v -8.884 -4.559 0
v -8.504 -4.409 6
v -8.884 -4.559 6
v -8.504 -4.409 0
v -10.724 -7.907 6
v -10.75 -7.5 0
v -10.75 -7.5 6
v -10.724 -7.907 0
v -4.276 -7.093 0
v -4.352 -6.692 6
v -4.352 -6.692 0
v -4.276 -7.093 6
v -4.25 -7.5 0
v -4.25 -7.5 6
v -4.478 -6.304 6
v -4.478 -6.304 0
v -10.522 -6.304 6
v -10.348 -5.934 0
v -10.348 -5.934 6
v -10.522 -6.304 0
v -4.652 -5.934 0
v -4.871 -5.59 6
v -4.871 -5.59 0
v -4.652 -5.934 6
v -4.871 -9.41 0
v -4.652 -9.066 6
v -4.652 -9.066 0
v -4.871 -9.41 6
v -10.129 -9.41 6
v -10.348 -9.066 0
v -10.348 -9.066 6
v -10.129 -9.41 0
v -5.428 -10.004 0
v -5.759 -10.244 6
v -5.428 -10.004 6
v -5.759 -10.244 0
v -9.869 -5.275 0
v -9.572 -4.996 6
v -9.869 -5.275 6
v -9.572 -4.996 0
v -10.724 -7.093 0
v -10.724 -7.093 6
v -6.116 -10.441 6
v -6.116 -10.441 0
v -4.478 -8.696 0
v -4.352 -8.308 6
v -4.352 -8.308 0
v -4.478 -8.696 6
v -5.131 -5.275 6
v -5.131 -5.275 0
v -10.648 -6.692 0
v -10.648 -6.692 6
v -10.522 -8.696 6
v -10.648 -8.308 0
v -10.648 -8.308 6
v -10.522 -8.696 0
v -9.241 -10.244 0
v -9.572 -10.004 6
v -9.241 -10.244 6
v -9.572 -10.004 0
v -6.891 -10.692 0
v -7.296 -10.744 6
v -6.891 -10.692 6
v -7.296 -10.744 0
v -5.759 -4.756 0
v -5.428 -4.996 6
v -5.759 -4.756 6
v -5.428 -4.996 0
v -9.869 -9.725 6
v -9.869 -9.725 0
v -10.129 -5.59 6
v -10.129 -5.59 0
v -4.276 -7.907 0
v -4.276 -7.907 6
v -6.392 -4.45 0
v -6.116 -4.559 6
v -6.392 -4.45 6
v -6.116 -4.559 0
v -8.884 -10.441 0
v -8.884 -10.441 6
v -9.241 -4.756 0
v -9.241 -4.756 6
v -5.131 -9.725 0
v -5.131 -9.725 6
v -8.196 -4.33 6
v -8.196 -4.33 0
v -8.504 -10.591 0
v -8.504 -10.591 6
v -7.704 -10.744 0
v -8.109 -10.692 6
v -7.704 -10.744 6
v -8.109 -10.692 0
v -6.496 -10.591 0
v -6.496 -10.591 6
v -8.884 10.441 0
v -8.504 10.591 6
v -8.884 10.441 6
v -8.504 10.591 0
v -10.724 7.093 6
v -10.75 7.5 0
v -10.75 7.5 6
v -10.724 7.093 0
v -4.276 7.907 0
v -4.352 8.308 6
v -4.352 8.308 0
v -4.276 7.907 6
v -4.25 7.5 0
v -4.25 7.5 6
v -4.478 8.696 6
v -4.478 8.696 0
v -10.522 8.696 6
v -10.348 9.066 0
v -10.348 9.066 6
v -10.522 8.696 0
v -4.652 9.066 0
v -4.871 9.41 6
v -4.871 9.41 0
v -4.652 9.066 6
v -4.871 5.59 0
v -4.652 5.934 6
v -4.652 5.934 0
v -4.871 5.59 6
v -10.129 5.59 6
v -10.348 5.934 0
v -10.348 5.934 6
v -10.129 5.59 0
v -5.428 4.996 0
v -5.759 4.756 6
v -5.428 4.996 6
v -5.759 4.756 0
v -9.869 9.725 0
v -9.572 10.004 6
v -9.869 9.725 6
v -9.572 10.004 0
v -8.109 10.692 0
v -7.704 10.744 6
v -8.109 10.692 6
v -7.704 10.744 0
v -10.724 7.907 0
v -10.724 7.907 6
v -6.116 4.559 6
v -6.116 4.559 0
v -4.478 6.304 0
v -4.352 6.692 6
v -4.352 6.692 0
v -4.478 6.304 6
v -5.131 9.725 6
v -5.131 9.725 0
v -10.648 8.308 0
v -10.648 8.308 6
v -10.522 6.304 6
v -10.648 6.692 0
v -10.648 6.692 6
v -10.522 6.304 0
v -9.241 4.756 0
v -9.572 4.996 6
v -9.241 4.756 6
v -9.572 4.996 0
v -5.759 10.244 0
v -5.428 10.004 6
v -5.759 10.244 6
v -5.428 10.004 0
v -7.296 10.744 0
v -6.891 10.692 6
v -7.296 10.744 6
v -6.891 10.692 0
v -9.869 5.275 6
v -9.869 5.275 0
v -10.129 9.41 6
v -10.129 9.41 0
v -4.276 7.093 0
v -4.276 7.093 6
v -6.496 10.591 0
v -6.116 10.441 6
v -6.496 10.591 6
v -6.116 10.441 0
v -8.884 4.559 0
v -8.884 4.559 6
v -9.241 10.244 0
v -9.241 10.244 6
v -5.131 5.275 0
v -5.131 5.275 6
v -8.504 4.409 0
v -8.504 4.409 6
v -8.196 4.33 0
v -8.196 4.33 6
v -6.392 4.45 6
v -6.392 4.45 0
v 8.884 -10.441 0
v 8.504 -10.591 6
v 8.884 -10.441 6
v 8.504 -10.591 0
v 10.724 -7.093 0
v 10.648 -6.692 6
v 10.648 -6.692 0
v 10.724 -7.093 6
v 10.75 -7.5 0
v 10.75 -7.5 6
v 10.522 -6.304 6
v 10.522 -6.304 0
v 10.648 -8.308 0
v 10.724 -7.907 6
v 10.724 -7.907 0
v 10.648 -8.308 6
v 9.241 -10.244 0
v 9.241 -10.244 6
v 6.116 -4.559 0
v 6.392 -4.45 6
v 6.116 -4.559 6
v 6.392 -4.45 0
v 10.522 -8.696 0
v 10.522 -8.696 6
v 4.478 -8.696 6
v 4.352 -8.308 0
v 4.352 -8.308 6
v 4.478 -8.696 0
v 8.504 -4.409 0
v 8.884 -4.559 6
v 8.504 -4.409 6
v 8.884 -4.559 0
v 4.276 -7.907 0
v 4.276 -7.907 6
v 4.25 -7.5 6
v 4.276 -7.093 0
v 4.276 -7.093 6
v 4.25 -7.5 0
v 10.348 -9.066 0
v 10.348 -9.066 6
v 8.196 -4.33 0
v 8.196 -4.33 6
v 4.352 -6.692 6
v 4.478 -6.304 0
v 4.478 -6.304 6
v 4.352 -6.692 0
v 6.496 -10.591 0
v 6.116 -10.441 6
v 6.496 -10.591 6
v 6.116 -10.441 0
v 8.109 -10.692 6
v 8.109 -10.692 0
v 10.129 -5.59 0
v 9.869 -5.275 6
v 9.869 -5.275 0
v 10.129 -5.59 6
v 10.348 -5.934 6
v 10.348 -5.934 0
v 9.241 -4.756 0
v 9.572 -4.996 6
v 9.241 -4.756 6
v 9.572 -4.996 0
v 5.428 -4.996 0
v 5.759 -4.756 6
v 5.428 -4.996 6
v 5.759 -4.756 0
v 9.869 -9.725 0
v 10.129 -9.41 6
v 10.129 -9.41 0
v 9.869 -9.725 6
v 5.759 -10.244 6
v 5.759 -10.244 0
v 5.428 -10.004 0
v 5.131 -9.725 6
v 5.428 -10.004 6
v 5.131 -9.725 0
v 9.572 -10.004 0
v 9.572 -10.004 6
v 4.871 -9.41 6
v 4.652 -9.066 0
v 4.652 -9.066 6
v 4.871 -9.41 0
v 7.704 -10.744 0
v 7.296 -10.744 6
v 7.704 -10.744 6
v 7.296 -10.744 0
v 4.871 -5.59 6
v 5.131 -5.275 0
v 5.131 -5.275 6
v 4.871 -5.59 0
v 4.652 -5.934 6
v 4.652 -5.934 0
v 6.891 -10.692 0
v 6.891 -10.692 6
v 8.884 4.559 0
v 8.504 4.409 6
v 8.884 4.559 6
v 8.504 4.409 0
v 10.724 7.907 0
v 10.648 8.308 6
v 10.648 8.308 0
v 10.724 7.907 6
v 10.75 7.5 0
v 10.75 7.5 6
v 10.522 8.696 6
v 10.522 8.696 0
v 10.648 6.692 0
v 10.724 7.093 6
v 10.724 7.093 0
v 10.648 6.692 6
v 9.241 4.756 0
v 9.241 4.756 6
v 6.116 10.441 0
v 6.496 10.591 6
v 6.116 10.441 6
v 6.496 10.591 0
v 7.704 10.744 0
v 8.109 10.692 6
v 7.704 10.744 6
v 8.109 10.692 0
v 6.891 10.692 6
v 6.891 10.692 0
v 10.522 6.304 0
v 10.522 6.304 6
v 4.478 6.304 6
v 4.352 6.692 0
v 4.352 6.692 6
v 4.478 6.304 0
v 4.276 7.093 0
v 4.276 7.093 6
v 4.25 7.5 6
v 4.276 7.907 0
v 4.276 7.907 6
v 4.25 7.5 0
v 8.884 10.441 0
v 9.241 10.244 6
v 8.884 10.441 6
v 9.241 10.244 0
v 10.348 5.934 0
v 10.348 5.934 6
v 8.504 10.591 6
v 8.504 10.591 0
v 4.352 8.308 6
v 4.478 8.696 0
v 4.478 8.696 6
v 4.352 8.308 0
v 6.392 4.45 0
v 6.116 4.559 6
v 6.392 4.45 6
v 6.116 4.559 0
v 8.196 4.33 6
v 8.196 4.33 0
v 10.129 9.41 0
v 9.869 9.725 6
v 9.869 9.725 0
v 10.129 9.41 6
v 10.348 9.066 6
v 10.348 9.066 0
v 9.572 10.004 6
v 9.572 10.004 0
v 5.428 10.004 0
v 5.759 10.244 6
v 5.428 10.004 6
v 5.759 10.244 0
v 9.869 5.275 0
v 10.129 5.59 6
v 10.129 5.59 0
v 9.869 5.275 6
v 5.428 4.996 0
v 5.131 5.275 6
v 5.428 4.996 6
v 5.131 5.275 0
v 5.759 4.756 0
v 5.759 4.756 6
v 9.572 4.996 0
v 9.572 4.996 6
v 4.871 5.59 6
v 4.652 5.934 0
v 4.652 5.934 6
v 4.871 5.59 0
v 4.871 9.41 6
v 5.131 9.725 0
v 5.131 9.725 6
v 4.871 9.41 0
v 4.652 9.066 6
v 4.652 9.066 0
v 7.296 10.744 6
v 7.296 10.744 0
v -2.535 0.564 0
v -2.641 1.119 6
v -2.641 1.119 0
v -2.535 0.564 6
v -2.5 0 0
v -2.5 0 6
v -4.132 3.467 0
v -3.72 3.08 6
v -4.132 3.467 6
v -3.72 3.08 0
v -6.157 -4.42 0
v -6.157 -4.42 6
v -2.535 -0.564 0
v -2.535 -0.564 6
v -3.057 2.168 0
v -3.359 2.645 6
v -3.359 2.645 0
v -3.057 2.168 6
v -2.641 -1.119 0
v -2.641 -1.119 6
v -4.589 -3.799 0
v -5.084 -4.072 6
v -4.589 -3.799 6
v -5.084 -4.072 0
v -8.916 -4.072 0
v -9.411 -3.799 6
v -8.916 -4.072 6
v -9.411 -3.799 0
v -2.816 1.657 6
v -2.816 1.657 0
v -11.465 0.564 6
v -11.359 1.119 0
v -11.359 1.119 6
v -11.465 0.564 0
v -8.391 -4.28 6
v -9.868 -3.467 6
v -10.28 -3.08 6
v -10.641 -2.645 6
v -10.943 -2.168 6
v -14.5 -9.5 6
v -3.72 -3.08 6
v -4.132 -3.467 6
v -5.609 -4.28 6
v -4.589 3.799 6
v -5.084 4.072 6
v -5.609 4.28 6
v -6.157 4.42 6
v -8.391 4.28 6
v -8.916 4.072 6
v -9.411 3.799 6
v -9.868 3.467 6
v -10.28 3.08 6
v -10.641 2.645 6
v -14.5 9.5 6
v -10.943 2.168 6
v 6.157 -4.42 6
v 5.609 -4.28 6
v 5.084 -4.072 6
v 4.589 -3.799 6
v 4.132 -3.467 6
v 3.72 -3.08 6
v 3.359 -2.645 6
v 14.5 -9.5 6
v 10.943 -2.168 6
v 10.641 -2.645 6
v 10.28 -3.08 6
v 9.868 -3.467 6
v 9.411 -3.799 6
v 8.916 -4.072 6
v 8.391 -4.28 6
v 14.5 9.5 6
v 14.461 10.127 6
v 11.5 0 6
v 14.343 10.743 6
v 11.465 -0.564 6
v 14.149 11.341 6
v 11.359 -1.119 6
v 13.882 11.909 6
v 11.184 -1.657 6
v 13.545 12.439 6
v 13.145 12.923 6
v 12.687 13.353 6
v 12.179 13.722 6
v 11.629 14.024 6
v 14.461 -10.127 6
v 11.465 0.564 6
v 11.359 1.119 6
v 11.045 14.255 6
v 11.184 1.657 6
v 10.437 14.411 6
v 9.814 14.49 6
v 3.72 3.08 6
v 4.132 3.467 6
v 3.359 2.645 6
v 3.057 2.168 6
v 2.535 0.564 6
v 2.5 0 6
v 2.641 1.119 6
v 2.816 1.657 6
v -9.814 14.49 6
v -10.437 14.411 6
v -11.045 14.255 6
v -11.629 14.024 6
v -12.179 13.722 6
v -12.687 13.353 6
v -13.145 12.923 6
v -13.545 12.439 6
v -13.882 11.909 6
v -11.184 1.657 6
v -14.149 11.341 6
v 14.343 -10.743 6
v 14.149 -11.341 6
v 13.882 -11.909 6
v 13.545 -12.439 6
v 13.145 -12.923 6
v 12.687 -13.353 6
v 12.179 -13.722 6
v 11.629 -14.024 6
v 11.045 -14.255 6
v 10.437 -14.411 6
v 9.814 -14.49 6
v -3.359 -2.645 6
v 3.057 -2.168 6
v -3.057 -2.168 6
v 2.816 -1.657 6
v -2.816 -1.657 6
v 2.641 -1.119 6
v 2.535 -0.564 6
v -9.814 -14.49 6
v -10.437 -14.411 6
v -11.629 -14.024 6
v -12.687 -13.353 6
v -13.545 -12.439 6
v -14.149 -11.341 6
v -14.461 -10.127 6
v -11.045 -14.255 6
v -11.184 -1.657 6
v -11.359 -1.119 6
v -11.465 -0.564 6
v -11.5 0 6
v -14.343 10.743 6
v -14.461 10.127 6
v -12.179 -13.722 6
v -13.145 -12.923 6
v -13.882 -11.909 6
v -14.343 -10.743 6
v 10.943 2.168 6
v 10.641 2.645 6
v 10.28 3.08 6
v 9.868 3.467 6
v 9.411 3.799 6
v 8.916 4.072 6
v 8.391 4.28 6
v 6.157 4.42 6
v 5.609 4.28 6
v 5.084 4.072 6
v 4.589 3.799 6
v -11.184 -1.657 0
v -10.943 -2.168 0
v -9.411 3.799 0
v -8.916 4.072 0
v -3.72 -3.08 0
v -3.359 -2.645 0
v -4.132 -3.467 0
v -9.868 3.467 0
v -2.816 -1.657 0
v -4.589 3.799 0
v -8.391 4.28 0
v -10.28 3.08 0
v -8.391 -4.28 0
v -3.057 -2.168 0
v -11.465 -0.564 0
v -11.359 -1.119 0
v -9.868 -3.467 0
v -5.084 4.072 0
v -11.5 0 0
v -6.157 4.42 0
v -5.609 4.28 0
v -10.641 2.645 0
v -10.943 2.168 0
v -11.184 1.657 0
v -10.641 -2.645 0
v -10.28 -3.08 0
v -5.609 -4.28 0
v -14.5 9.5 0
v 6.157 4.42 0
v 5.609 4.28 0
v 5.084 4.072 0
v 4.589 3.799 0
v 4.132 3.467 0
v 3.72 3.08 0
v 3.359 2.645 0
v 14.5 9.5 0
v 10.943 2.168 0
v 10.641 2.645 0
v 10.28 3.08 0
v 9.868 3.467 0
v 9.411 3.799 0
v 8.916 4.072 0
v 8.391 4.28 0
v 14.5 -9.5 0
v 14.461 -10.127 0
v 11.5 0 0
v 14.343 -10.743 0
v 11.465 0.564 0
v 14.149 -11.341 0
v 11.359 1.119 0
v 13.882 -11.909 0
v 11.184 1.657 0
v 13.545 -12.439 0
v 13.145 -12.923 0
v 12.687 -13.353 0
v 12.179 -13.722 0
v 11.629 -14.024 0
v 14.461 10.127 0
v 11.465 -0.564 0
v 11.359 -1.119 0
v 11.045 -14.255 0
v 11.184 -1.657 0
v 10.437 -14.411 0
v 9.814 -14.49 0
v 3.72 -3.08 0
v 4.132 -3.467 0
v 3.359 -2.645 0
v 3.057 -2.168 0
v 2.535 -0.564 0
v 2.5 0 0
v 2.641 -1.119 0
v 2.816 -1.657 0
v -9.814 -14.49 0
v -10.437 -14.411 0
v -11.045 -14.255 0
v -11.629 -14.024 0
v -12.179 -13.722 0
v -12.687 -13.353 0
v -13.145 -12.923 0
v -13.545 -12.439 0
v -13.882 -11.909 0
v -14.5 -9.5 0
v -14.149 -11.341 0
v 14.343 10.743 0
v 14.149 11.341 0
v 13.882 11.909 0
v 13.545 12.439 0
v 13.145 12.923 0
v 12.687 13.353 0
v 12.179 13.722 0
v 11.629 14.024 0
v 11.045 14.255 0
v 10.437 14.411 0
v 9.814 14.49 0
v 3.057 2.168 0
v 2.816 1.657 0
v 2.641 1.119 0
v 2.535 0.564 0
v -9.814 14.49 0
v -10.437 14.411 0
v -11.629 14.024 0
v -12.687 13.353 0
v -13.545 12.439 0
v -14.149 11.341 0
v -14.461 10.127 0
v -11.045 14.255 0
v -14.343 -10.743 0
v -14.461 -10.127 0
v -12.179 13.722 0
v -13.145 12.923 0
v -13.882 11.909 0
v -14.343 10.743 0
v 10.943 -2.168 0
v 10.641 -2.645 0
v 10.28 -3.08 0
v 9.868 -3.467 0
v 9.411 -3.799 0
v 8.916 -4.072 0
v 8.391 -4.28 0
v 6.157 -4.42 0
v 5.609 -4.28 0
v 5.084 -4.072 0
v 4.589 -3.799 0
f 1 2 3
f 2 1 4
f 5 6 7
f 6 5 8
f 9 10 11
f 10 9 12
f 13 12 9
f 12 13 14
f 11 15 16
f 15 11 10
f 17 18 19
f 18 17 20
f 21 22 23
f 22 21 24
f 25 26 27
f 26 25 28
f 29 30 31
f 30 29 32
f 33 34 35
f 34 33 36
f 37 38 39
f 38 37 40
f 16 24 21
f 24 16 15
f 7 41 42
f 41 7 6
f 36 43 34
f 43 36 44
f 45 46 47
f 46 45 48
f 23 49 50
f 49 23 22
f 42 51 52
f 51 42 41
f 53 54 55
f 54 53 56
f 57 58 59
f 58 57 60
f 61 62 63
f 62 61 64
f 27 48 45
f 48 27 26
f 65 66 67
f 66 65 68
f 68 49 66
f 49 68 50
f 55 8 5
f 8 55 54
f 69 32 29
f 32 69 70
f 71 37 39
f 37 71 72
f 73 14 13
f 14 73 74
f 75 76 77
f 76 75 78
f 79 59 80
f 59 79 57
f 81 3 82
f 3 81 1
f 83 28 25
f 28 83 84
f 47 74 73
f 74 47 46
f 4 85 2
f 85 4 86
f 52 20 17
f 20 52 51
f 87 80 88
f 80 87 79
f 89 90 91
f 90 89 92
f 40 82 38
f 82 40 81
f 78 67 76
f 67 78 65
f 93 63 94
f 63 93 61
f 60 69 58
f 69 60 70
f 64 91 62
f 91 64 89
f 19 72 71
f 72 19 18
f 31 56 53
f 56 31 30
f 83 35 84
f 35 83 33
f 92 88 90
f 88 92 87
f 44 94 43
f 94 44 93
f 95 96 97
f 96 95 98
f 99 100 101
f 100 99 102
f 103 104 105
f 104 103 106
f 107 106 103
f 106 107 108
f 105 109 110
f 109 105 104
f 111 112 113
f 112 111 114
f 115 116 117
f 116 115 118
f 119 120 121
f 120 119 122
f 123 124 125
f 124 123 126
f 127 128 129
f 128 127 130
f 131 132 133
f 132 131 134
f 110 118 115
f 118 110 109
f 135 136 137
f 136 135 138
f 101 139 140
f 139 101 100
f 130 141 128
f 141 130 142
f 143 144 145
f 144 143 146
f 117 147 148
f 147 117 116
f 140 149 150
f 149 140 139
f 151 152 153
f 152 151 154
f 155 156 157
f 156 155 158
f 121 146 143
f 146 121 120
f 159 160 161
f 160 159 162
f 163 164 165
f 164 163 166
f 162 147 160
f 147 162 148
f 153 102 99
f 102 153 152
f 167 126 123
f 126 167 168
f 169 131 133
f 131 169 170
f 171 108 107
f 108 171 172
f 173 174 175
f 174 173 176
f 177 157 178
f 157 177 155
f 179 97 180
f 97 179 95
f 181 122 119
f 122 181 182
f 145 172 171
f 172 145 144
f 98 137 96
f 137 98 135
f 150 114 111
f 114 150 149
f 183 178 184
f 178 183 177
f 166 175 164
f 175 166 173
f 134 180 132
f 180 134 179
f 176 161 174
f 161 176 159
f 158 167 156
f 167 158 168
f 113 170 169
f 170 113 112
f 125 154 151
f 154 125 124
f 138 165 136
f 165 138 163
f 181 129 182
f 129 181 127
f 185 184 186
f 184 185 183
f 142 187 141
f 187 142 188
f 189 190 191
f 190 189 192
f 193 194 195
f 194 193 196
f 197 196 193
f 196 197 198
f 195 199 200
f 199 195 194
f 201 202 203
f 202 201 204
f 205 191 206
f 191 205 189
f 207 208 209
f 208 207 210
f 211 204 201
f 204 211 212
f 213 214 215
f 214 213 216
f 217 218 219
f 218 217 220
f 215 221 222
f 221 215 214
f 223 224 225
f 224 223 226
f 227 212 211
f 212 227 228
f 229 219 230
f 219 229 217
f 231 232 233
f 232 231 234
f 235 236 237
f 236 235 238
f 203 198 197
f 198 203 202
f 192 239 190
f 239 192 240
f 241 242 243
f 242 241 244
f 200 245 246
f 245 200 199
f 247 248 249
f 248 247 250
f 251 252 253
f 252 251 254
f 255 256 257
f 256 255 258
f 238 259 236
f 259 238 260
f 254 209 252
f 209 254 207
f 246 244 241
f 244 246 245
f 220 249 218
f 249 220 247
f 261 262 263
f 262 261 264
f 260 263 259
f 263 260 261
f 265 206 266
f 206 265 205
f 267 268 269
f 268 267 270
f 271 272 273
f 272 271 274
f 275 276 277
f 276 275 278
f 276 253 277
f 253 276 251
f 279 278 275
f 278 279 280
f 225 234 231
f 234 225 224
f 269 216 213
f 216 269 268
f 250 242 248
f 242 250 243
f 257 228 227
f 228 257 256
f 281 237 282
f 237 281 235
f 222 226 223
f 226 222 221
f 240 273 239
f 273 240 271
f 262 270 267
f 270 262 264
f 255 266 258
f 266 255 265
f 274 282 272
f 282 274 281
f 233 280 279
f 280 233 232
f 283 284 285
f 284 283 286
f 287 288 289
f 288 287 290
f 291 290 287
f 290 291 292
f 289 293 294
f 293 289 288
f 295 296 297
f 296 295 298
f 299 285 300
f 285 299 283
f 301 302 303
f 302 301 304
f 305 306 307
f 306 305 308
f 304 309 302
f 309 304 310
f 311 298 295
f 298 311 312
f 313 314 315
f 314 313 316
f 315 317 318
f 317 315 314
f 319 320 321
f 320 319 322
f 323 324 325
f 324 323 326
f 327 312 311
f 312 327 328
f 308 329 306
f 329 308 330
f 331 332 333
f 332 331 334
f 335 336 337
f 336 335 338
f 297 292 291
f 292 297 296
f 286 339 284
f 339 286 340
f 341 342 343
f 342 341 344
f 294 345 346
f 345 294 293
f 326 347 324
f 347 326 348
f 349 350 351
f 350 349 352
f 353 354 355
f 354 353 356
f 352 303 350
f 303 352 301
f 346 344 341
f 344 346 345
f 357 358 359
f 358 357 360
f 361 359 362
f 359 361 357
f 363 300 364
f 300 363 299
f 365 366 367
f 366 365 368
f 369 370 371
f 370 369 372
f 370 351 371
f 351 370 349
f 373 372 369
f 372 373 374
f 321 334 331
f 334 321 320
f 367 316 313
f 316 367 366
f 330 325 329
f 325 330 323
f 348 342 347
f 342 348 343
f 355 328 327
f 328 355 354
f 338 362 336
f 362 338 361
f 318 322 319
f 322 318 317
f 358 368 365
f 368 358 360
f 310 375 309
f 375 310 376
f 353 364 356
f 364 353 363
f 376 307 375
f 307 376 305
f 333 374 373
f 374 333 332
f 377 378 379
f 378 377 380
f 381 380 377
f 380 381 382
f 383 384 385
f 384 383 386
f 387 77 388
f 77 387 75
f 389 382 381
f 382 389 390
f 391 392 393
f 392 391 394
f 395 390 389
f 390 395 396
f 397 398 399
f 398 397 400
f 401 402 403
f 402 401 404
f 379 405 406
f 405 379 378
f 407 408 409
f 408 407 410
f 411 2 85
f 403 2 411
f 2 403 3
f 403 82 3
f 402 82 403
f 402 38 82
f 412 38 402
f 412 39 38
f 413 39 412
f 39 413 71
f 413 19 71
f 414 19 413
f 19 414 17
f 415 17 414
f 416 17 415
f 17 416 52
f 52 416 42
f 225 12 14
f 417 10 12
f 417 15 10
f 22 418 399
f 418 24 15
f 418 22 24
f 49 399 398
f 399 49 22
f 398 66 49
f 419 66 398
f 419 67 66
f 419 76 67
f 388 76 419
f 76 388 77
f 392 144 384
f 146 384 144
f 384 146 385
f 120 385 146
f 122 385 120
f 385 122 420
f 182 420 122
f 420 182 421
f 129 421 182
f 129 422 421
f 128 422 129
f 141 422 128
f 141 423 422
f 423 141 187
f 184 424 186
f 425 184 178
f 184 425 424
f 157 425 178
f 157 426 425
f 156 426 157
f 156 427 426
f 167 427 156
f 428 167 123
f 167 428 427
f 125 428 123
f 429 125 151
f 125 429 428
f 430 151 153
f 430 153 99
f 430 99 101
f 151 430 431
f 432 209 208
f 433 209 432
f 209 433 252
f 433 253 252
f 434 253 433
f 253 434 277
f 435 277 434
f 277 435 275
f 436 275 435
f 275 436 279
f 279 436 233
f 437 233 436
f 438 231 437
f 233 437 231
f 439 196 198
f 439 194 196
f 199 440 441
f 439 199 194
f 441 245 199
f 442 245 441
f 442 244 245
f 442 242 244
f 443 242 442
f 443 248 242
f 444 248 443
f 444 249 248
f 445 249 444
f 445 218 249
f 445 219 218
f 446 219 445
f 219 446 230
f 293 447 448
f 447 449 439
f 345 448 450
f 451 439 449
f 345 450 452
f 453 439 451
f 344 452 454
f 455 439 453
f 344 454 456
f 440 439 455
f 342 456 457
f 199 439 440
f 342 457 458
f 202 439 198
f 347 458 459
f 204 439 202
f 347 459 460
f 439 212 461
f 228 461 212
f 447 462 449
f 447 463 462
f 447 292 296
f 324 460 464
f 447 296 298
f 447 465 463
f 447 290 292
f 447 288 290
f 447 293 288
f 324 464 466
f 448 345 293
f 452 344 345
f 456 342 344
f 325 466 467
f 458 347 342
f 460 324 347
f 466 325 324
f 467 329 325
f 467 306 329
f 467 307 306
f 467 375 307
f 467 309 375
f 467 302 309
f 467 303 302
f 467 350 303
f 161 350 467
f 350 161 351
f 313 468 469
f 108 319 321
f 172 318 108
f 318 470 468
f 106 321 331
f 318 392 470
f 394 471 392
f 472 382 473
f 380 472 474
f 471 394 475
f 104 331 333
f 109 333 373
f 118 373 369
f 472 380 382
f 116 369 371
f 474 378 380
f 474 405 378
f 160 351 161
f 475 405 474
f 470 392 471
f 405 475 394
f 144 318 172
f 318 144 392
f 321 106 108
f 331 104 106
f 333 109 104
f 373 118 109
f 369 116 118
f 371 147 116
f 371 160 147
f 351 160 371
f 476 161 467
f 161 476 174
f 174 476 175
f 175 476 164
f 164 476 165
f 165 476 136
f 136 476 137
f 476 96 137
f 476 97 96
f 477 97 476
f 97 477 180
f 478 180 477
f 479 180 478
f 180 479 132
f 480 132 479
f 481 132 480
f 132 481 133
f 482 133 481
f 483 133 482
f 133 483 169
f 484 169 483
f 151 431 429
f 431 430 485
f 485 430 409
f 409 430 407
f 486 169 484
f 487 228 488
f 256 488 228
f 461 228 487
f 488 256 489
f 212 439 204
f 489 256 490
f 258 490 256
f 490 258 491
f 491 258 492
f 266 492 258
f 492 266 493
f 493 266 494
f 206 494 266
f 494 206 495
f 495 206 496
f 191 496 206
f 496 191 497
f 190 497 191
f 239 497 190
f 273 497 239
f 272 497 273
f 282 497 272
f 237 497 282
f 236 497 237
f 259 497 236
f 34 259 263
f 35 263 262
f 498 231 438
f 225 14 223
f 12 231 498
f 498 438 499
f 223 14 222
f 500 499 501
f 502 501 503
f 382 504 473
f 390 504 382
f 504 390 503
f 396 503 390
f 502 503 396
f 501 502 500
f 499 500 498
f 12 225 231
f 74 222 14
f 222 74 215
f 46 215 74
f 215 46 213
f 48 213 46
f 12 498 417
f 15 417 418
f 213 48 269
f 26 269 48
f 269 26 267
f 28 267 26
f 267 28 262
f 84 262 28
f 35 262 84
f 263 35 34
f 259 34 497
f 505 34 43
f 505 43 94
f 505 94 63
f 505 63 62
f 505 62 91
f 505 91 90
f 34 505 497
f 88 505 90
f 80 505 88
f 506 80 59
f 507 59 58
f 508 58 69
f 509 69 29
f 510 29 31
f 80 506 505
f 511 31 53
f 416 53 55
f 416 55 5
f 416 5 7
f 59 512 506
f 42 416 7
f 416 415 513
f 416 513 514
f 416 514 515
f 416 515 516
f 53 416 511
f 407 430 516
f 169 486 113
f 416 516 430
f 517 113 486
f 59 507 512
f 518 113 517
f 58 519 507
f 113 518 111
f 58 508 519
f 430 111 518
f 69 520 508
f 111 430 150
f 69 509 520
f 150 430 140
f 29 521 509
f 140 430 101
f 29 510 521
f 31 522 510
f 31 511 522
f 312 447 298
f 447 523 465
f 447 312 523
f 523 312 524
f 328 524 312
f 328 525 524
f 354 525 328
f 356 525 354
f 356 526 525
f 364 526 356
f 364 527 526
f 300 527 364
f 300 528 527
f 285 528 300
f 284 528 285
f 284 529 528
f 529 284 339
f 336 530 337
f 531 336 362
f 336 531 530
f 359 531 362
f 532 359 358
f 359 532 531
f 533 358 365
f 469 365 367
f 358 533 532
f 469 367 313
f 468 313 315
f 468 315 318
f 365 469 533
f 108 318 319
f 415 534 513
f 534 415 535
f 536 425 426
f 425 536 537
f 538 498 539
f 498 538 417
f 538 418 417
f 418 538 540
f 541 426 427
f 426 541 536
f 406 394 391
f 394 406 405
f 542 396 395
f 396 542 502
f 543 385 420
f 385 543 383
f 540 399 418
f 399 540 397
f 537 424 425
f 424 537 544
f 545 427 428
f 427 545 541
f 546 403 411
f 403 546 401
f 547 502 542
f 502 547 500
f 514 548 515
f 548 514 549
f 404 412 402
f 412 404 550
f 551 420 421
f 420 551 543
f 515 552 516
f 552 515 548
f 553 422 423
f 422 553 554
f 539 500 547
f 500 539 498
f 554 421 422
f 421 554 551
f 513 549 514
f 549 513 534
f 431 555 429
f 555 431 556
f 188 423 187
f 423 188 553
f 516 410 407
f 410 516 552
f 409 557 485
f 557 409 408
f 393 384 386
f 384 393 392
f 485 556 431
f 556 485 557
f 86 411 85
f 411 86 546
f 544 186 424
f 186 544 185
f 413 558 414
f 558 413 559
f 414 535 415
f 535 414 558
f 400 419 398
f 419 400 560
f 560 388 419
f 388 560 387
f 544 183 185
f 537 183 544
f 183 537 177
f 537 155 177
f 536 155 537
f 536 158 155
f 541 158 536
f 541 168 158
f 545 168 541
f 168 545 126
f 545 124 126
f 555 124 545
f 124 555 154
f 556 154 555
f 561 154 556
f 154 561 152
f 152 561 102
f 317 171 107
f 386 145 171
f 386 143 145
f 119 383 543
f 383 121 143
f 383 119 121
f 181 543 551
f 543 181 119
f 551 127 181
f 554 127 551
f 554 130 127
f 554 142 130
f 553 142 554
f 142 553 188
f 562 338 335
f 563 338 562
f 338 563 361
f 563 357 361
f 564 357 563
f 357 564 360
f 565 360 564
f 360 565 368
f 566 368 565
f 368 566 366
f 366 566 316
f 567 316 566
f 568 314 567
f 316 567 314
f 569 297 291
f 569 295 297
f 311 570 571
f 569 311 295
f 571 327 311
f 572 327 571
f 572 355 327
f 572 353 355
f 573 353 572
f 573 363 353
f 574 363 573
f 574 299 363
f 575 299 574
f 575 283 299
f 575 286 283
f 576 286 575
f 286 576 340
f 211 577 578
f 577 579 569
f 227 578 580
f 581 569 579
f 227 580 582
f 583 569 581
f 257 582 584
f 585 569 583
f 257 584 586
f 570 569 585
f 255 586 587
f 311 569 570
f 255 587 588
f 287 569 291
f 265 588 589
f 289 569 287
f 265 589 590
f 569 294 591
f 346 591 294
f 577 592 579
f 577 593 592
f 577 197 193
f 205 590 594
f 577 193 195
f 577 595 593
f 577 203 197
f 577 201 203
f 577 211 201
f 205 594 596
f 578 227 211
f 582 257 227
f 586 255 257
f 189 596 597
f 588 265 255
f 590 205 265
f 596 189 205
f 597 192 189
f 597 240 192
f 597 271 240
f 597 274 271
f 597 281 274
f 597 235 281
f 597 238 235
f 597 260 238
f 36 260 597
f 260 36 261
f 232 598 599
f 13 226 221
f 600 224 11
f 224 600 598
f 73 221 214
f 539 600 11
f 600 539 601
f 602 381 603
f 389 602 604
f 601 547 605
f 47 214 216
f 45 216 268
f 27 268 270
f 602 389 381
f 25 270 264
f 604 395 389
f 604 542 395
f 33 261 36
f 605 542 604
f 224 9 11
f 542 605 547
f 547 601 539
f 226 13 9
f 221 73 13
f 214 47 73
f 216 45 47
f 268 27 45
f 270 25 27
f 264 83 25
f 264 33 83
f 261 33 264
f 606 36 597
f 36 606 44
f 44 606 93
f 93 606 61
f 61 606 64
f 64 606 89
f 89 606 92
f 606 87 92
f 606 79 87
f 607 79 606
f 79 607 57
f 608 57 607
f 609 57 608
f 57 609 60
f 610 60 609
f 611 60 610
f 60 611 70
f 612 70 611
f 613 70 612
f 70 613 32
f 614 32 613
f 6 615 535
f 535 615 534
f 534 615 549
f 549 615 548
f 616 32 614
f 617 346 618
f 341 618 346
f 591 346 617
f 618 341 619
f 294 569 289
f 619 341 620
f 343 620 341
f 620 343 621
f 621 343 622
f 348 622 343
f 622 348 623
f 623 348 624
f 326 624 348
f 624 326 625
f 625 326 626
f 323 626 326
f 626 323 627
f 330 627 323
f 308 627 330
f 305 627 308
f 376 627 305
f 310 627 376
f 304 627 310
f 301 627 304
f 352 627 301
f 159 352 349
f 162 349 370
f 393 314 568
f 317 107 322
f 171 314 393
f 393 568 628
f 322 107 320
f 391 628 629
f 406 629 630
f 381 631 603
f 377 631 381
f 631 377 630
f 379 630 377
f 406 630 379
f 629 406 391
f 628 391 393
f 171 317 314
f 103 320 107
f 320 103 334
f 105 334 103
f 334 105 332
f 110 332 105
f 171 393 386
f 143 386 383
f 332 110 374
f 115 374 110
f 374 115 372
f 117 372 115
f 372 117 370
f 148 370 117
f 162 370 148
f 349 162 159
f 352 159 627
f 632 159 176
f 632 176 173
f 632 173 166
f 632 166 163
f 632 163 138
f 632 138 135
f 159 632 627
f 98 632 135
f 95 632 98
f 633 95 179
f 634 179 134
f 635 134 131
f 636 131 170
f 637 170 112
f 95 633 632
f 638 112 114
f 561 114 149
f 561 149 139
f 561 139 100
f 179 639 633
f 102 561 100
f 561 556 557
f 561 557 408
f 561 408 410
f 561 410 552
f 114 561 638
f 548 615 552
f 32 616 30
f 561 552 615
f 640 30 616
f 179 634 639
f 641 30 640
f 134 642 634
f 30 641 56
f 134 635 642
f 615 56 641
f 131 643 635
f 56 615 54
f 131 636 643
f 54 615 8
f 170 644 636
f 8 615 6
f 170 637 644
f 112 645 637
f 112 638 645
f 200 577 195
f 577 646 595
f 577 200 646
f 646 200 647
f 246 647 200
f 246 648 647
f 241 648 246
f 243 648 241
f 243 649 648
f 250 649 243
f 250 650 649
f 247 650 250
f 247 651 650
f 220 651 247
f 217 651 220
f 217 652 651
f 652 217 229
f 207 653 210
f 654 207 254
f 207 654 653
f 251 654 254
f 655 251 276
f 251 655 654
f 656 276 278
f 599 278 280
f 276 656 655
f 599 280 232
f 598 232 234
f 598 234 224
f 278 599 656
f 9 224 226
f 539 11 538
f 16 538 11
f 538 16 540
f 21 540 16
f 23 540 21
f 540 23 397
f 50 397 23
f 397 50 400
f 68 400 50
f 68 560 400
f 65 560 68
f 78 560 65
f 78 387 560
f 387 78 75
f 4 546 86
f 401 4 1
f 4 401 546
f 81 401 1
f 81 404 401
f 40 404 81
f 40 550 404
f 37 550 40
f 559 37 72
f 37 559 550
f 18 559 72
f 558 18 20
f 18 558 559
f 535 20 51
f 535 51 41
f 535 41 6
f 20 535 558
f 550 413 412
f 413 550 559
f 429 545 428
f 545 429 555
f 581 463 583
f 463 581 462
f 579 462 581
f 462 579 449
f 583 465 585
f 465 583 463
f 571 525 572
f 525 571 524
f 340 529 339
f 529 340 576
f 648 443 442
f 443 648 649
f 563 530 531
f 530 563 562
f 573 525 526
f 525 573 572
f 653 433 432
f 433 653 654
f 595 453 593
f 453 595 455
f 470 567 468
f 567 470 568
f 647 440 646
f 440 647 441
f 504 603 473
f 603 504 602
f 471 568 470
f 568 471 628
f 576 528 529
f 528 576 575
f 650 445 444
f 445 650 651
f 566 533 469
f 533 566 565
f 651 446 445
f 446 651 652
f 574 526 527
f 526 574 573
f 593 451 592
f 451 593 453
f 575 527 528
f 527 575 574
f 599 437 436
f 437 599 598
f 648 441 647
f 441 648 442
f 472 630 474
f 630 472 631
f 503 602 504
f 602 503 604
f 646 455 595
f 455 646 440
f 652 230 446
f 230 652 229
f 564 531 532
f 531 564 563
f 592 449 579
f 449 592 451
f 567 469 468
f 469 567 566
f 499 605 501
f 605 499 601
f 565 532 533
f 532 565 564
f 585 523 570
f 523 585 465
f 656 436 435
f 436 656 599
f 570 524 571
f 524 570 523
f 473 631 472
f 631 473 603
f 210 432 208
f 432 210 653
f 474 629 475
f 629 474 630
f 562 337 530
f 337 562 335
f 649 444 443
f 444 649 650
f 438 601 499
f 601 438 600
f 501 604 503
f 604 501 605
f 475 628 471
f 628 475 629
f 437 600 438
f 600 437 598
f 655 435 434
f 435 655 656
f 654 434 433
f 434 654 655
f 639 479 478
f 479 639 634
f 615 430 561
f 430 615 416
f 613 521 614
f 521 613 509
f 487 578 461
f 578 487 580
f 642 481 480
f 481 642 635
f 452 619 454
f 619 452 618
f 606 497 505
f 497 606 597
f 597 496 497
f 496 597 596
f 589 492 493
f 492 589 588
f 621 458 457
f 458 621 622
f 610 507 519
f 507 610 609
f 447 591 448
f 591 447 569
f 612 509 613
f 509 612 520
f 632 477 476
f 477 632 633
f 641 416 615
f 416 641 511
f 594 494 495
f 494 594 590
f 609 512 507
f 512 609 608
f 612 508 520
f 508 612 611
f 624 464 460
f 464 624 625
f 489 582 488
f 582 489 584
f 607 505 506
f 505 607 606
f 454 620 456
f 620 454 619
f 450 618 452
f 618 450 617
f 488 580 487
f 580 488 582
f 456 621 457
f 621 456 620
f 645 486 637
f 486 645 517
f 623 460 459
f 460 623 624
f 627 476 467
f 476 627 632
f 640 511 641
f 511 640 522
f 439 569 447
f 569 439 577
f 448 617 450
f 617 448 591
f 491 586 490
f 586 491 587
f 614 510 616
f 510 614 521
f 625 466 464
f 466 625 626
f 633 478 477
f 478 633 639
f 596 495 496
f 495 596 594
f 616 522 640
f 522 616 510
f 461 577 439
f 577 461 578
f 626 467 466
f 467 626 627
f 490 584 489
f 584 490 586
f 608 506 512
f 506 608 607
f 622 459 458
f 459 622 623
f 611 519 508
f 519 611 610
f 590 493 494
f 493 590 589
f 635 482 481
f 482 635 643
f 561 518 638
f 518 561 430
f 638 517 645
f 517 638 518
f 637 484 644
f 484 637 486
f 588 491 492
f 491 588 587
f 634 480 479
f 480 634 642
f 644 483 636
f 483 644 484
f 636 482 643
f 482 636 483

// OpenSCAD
$fn = 50;


difference() {
	union() {
		hull() {
			translate(v = [-9.5000000000, 9.5000000000, 0]) {
				cylinder(h = 6, r = 5);
			}
			translate(v = [9.5000000000, 9.5000000000, 0]) {
				cylinder(h = 6, r = 5);
			}
			translate(v = [-9.5000000000, -9.5000000000, 0]) {
				cylinder(h = 6, r = 5);
			}
			translate(v = [9.5000000000, -9.5000000000, 0]) {
				cylinder(h = 6, r = 5);
			}
		}
	}
	union() {
		#translate(v = [-7.5000000000, -7.5000000000, -100.0000000000]) {
			cylinder(h = 200, r = 3.2500000000);
		}
		#translate(v = [-7.5000000000, 7.5000000000, -100.0000000000]) {
			cylinder(h = 200, r = 3.2500000000);
		}
		#translate(v = [7.5000000000, -7.5000000000, -100.0000000000]) {
			cylinder(h = 200, r = 3.2500000000);
		}
		#translate(v = [7.5000000000, 7.5000000000, -100.0000000000]) {
			cylinder(h = 200, r = 3.2500000000);
		}
		#translate(v = [-7.0000000000, 0, 0]) {
			cylinder(h = 6, r = 4.5000000000);
		}
		#translate(v = [7.0000000000, 0, 0]) {
			cylinder(h = 6, r = 4.5000000000);
		}
	}
}
